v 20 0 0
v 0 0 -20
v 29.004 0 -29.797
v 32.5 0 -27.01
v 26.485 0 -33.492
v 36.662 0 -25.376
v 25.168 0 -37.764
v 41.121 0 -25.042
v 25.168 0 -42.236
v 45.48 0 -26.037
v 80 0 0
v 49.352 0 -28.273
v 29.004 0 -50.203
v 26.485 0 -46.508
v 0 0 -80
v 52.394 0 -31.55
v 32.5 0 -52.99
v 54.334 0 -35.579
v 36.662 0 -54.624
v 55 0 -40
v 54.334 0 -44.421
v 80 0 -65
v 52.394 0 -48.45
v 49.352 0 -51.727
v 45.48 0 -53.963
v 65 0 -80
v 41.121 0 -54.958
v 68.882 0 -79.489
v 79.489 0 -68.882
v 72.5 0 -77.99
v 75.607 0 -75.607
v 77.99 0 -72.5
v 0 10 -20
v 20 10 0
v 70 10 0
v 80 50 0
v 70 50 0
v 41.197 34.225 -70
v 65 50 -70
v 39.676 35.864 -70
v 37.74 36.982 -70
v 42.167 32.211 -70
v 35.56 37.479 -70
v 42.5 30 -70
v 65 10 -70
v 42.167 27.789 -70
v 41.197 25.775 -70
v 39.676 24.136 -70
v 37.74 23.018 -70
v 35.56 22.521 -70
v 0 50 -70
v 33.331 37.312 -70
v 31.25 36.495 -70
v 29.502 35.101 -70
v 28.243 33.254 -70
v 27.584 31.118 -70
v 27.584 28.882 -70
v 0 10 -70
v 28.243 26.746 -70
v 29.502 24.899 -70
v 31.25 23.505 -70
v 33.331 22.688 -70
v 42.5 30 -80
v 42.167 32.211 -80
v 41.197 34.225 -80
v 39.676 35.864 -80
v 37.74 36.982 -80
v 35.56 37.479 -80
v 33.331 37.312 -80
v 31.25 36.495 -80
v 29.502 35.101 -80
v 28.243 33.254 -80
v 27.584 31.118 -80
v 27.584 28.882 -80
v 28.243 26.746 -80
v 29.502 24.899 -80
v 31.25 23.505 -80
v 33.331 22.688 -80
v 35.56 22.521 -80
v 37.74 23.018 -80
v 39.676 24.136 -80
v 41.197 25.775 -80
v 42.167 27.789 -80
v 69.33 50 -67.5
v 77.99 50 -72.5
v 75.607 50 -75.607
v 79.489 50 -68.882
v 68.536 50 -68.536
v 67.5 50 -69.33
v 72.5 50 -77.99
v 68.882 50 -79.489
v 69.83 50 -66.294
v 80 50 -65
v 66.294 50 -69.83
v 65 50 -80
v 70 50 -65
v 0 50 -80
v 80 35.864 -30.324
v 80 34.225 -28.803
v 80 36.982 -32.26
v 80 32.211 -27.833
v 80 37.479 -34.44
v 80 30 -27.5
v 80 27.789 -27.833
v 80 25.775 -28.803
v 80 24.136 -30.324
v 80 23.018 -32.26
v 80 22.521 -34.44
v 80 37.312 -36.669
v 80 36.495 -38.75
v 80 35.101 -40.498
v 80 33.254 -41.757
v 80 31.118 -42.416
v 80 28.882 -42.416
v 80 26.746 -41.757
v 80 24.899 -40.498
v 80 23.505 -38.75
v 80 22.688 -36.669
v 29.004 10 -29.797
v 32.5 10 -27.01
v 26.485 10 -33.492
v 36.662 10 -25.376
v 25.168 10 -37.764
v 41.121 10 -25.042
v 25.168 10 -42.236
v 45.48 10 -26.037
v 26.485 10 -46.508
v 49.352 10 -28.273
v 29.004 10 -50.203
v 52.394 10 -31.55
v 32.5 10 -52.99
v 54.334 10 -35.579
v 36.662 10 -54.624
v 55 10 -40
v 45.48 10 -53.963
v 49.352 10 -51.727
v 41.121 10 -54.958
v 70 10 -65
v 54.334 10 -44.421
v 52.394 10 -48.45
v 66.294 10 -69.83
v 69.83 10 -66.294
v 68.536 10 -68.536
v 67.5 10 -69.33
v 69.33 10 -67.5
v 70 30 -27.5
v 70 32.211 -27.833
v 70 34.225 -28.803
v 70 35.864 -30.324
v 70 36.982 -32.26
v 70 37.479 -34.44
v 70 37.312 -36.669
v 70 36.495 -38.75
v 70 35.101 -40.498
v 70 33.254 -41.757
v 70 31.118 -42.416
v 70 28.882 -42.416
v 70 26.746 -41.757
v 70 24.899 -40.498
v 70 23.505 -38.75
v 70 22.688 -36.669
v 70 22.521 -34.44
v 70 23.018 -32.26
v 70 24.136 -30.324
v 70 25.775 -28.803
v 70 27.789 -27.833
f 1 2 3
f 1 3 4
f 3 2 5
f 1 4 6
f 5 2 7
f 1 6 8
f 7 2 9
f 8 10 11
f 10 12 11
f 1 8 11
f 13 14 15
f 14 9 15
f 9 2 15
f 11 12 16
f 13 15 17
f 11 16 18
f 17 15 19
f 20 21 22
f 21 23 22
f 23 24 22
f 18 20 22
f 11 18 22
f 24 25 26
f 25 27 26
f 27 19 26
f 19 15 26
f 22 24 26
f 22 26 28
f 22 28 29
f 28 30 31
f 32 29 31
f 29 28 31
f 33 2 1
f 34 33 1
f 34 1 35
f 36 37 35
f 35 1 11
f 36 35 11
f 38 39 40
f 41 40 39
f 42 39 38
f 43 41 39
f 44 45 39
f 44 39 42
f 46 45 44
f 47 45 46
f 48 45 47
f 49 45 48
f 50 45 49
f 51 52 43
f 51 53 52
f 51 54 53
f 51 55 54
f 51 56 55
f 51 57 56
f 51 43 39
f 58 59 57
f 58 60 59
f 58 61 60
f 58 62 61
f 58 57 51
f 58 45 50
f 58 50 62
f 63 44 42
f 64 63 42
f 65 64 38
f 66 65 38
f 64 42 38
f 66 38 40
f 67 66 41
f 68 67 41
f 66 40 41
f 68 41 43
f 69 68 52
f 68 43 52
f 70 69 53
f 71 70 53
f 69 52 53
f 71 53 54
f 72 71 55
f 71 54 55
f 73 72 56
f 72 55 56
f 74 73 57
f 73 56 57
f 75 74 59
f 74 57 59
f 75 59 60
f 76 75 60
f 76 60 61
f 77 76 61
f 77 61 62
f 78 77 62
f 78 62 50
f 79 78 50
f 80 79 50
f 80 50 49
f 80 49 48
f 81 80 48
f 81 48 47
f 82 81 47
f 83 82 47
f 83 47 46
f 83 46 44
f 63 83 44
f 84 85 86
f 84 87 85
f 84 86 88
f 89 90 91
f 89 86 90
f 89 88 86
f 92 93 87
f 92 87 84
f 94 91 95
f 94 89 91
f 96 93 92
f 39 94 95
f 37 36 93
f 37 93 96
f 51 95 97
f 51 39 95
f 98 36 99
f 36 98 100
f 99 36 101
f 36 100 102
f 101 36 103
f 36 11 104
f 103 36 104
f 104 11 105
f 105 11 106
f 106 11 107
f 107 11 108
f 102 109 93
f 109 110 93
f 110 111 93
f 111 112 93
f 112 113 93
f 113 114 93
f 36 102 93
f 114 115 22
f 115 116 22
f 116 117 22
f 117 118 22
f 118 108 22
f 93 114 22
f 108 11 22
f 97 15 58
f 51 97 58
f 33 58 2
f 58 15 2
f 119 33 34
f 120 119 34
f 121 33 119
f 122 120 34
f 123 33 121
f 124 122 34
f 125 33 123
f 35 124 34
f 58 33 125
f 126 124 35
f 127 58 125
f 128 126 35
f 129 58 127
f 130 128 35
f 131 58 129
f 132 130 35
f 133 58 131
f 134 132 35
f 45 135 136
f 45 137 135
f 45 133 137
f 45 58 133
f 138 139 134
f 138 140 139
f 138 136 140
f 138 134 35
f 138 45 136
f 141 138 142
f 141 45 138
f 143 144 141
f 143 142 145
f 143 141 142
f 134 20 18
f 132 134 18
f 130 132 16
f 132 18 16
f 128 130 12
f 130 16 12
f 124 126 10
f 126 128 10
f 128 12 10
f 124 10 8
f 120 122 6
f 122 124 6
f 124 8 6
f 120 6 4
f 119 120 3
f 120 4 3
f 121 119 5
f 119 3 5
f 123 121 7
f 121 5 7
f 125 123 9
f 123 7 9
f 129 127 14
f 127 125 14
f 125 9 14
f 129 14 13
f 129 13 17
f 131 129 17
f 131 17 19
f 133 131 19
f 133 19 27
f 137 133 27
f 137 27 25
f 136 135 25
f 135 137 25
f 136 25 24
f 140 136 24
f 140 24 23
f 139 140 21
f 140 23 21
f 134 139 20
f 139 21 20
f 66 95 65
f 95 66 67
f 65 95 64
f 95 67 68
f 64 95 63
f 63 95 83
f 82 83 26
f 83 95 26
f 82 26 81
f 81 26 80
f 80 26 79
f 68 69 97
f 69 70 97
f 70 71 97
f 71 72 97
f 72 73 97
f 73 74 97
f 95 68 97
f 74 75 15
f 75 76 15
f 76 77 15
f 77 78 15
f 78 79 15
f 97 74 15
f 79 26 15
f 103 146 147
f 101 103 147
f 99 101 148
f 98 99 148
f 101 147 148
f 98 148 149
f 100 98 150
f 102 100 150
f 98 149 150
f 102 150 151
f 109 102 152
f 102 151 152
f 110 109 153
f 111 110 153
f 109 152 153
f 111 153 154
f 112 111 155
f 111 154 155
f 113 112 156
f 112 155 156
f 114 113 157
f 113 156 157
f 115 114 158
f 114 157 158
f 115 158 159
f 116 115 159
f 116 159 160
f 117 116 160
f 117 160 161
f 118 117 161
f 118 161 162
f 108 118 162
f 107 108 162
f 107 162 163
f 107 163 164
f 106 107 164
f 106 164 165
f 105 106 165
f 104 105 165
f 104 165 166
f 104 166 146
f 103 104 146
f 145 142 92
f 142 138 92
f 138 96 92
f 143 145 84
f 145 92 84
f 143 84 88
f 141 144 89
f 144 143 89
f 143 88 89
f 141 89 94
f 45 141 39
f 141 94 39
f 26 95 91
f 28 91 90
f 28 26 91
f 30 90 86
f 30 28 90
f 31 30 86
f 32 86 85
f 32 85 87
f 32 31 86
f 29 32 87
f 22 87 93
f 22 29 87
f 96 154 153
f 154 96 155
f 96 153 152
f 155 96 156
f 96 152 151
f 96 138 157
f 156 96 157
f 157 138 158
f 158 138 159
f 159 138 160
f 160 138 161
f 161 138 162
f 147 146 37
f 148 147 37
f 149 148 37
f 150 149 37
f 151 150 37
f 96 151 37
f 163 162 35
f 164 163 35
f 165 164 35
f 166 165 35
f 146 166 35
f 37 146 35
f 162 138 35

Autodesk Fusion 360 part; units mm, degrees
sketch "Sketch1" plane through (0, 0, 0) normal (0, 1, 0) x (1, 0, 0)
  line L0 (0, 0) -> (80, 0)
  line L1 (80, 0) -> (80, 80)
  line L2 (80, 80) -> (0, 80)
  line L3 (0, 80) -> (0, 0)
  circle A0 centre (40, 40) radius 15
  line L4 (0, 20) -> (20, 0)
  dimension "d1" = 80
  dimension "d2" = 80
  dimension "d3" = 30
  dimension "d4" = 40
  dimension "d5" = 40
  dimension "d6" = 20
  dimension "d7" = 20
extrude "Extrude1" add sketch "Sketch1" along normal blind 10 contours L0 L1 L2 L3 L4
sketch "Sketch2" plane through (0, 10, 0) normal (0, 1, 0) x (-1, 0, 0)
  circle A0 centre (-40, -40) radius 15
  line L0 (0, -20) -> (-20, 0)
  line L1 (-20, 0) -> (-80, 0)
  line L2 (-80, 0) -> (-80, -80)
  line L3 (-80, -80) -> (0, -80)
  line L4 (0, -80) -> (0, -20)
  line L5 (0, -80) -> (-80, -80)
  line L6 (-80, -80) -> (-80, -70)
  line L7 (-80, -70) -> (0, -70)
  line L8 (0, -70) -> (0, -80)
  line L9 (-80, -80) -> (-70, -80)
  line L10 (-70, -80) -> (-70, 0)
  line L11 (-70, 0) -> (-80, 0)
  line L12 (-80, 0) -> (-80, -80)
  dimension "d10" = 10
  dimension "d11" = 10
extrude "Extrude2" add sketch "Sketch2" along normal blind 40 contours L3 L4 L5 L7 L8 L10 | L1 L2 L7 L10 L11 L12 | L2 L3 L5 L6 L7 L9 L10 L12
fillet "Fillet1" radius 5 1 edges at (70, 30, -70)
fillet "Fillet2" radius 15 1 edges at (80, 25, -80)
sketch "Sketch3" plane through (70, 0, 0) normal (-1, 0, 0) x (0, 0, 1)
  line L0 (-65, 50) -> (-65, 10)
  line L1 (-65, 10) -> (0, 10)
  line L2 (0, 10) -> (0, 50)
  line L3 (0, 50) -> (-65, 50)
  circle A0 centre (-35, 30) radius 7.5
  dimension "d18" = 15
  dimension "d19" = 35
  dimension "d20" = 20
extrude "Extrude3" cut sketch "Sketch3" against normal blind 10 contours A0
sketch "Sketch4" plane through (0, 0, -70) normal (0, 0, 1) x (1, 0, 0)
  line L0 (65, 10) -> (65, 50)
  line L1 (65, 50) -> (0, 50)
  line L2 (0, 50) -> (0, 10)
  line L3 (0, 10) -> (65, 10)
  circle A0 centre (35, 30) radius 7.5
  dimension "d23" = 15
  dimension "d24" = 35
  dimension "d25" = 20
extrude "Extrude4" cut sketch "Sketch4" against normal blind 10 contours A0
